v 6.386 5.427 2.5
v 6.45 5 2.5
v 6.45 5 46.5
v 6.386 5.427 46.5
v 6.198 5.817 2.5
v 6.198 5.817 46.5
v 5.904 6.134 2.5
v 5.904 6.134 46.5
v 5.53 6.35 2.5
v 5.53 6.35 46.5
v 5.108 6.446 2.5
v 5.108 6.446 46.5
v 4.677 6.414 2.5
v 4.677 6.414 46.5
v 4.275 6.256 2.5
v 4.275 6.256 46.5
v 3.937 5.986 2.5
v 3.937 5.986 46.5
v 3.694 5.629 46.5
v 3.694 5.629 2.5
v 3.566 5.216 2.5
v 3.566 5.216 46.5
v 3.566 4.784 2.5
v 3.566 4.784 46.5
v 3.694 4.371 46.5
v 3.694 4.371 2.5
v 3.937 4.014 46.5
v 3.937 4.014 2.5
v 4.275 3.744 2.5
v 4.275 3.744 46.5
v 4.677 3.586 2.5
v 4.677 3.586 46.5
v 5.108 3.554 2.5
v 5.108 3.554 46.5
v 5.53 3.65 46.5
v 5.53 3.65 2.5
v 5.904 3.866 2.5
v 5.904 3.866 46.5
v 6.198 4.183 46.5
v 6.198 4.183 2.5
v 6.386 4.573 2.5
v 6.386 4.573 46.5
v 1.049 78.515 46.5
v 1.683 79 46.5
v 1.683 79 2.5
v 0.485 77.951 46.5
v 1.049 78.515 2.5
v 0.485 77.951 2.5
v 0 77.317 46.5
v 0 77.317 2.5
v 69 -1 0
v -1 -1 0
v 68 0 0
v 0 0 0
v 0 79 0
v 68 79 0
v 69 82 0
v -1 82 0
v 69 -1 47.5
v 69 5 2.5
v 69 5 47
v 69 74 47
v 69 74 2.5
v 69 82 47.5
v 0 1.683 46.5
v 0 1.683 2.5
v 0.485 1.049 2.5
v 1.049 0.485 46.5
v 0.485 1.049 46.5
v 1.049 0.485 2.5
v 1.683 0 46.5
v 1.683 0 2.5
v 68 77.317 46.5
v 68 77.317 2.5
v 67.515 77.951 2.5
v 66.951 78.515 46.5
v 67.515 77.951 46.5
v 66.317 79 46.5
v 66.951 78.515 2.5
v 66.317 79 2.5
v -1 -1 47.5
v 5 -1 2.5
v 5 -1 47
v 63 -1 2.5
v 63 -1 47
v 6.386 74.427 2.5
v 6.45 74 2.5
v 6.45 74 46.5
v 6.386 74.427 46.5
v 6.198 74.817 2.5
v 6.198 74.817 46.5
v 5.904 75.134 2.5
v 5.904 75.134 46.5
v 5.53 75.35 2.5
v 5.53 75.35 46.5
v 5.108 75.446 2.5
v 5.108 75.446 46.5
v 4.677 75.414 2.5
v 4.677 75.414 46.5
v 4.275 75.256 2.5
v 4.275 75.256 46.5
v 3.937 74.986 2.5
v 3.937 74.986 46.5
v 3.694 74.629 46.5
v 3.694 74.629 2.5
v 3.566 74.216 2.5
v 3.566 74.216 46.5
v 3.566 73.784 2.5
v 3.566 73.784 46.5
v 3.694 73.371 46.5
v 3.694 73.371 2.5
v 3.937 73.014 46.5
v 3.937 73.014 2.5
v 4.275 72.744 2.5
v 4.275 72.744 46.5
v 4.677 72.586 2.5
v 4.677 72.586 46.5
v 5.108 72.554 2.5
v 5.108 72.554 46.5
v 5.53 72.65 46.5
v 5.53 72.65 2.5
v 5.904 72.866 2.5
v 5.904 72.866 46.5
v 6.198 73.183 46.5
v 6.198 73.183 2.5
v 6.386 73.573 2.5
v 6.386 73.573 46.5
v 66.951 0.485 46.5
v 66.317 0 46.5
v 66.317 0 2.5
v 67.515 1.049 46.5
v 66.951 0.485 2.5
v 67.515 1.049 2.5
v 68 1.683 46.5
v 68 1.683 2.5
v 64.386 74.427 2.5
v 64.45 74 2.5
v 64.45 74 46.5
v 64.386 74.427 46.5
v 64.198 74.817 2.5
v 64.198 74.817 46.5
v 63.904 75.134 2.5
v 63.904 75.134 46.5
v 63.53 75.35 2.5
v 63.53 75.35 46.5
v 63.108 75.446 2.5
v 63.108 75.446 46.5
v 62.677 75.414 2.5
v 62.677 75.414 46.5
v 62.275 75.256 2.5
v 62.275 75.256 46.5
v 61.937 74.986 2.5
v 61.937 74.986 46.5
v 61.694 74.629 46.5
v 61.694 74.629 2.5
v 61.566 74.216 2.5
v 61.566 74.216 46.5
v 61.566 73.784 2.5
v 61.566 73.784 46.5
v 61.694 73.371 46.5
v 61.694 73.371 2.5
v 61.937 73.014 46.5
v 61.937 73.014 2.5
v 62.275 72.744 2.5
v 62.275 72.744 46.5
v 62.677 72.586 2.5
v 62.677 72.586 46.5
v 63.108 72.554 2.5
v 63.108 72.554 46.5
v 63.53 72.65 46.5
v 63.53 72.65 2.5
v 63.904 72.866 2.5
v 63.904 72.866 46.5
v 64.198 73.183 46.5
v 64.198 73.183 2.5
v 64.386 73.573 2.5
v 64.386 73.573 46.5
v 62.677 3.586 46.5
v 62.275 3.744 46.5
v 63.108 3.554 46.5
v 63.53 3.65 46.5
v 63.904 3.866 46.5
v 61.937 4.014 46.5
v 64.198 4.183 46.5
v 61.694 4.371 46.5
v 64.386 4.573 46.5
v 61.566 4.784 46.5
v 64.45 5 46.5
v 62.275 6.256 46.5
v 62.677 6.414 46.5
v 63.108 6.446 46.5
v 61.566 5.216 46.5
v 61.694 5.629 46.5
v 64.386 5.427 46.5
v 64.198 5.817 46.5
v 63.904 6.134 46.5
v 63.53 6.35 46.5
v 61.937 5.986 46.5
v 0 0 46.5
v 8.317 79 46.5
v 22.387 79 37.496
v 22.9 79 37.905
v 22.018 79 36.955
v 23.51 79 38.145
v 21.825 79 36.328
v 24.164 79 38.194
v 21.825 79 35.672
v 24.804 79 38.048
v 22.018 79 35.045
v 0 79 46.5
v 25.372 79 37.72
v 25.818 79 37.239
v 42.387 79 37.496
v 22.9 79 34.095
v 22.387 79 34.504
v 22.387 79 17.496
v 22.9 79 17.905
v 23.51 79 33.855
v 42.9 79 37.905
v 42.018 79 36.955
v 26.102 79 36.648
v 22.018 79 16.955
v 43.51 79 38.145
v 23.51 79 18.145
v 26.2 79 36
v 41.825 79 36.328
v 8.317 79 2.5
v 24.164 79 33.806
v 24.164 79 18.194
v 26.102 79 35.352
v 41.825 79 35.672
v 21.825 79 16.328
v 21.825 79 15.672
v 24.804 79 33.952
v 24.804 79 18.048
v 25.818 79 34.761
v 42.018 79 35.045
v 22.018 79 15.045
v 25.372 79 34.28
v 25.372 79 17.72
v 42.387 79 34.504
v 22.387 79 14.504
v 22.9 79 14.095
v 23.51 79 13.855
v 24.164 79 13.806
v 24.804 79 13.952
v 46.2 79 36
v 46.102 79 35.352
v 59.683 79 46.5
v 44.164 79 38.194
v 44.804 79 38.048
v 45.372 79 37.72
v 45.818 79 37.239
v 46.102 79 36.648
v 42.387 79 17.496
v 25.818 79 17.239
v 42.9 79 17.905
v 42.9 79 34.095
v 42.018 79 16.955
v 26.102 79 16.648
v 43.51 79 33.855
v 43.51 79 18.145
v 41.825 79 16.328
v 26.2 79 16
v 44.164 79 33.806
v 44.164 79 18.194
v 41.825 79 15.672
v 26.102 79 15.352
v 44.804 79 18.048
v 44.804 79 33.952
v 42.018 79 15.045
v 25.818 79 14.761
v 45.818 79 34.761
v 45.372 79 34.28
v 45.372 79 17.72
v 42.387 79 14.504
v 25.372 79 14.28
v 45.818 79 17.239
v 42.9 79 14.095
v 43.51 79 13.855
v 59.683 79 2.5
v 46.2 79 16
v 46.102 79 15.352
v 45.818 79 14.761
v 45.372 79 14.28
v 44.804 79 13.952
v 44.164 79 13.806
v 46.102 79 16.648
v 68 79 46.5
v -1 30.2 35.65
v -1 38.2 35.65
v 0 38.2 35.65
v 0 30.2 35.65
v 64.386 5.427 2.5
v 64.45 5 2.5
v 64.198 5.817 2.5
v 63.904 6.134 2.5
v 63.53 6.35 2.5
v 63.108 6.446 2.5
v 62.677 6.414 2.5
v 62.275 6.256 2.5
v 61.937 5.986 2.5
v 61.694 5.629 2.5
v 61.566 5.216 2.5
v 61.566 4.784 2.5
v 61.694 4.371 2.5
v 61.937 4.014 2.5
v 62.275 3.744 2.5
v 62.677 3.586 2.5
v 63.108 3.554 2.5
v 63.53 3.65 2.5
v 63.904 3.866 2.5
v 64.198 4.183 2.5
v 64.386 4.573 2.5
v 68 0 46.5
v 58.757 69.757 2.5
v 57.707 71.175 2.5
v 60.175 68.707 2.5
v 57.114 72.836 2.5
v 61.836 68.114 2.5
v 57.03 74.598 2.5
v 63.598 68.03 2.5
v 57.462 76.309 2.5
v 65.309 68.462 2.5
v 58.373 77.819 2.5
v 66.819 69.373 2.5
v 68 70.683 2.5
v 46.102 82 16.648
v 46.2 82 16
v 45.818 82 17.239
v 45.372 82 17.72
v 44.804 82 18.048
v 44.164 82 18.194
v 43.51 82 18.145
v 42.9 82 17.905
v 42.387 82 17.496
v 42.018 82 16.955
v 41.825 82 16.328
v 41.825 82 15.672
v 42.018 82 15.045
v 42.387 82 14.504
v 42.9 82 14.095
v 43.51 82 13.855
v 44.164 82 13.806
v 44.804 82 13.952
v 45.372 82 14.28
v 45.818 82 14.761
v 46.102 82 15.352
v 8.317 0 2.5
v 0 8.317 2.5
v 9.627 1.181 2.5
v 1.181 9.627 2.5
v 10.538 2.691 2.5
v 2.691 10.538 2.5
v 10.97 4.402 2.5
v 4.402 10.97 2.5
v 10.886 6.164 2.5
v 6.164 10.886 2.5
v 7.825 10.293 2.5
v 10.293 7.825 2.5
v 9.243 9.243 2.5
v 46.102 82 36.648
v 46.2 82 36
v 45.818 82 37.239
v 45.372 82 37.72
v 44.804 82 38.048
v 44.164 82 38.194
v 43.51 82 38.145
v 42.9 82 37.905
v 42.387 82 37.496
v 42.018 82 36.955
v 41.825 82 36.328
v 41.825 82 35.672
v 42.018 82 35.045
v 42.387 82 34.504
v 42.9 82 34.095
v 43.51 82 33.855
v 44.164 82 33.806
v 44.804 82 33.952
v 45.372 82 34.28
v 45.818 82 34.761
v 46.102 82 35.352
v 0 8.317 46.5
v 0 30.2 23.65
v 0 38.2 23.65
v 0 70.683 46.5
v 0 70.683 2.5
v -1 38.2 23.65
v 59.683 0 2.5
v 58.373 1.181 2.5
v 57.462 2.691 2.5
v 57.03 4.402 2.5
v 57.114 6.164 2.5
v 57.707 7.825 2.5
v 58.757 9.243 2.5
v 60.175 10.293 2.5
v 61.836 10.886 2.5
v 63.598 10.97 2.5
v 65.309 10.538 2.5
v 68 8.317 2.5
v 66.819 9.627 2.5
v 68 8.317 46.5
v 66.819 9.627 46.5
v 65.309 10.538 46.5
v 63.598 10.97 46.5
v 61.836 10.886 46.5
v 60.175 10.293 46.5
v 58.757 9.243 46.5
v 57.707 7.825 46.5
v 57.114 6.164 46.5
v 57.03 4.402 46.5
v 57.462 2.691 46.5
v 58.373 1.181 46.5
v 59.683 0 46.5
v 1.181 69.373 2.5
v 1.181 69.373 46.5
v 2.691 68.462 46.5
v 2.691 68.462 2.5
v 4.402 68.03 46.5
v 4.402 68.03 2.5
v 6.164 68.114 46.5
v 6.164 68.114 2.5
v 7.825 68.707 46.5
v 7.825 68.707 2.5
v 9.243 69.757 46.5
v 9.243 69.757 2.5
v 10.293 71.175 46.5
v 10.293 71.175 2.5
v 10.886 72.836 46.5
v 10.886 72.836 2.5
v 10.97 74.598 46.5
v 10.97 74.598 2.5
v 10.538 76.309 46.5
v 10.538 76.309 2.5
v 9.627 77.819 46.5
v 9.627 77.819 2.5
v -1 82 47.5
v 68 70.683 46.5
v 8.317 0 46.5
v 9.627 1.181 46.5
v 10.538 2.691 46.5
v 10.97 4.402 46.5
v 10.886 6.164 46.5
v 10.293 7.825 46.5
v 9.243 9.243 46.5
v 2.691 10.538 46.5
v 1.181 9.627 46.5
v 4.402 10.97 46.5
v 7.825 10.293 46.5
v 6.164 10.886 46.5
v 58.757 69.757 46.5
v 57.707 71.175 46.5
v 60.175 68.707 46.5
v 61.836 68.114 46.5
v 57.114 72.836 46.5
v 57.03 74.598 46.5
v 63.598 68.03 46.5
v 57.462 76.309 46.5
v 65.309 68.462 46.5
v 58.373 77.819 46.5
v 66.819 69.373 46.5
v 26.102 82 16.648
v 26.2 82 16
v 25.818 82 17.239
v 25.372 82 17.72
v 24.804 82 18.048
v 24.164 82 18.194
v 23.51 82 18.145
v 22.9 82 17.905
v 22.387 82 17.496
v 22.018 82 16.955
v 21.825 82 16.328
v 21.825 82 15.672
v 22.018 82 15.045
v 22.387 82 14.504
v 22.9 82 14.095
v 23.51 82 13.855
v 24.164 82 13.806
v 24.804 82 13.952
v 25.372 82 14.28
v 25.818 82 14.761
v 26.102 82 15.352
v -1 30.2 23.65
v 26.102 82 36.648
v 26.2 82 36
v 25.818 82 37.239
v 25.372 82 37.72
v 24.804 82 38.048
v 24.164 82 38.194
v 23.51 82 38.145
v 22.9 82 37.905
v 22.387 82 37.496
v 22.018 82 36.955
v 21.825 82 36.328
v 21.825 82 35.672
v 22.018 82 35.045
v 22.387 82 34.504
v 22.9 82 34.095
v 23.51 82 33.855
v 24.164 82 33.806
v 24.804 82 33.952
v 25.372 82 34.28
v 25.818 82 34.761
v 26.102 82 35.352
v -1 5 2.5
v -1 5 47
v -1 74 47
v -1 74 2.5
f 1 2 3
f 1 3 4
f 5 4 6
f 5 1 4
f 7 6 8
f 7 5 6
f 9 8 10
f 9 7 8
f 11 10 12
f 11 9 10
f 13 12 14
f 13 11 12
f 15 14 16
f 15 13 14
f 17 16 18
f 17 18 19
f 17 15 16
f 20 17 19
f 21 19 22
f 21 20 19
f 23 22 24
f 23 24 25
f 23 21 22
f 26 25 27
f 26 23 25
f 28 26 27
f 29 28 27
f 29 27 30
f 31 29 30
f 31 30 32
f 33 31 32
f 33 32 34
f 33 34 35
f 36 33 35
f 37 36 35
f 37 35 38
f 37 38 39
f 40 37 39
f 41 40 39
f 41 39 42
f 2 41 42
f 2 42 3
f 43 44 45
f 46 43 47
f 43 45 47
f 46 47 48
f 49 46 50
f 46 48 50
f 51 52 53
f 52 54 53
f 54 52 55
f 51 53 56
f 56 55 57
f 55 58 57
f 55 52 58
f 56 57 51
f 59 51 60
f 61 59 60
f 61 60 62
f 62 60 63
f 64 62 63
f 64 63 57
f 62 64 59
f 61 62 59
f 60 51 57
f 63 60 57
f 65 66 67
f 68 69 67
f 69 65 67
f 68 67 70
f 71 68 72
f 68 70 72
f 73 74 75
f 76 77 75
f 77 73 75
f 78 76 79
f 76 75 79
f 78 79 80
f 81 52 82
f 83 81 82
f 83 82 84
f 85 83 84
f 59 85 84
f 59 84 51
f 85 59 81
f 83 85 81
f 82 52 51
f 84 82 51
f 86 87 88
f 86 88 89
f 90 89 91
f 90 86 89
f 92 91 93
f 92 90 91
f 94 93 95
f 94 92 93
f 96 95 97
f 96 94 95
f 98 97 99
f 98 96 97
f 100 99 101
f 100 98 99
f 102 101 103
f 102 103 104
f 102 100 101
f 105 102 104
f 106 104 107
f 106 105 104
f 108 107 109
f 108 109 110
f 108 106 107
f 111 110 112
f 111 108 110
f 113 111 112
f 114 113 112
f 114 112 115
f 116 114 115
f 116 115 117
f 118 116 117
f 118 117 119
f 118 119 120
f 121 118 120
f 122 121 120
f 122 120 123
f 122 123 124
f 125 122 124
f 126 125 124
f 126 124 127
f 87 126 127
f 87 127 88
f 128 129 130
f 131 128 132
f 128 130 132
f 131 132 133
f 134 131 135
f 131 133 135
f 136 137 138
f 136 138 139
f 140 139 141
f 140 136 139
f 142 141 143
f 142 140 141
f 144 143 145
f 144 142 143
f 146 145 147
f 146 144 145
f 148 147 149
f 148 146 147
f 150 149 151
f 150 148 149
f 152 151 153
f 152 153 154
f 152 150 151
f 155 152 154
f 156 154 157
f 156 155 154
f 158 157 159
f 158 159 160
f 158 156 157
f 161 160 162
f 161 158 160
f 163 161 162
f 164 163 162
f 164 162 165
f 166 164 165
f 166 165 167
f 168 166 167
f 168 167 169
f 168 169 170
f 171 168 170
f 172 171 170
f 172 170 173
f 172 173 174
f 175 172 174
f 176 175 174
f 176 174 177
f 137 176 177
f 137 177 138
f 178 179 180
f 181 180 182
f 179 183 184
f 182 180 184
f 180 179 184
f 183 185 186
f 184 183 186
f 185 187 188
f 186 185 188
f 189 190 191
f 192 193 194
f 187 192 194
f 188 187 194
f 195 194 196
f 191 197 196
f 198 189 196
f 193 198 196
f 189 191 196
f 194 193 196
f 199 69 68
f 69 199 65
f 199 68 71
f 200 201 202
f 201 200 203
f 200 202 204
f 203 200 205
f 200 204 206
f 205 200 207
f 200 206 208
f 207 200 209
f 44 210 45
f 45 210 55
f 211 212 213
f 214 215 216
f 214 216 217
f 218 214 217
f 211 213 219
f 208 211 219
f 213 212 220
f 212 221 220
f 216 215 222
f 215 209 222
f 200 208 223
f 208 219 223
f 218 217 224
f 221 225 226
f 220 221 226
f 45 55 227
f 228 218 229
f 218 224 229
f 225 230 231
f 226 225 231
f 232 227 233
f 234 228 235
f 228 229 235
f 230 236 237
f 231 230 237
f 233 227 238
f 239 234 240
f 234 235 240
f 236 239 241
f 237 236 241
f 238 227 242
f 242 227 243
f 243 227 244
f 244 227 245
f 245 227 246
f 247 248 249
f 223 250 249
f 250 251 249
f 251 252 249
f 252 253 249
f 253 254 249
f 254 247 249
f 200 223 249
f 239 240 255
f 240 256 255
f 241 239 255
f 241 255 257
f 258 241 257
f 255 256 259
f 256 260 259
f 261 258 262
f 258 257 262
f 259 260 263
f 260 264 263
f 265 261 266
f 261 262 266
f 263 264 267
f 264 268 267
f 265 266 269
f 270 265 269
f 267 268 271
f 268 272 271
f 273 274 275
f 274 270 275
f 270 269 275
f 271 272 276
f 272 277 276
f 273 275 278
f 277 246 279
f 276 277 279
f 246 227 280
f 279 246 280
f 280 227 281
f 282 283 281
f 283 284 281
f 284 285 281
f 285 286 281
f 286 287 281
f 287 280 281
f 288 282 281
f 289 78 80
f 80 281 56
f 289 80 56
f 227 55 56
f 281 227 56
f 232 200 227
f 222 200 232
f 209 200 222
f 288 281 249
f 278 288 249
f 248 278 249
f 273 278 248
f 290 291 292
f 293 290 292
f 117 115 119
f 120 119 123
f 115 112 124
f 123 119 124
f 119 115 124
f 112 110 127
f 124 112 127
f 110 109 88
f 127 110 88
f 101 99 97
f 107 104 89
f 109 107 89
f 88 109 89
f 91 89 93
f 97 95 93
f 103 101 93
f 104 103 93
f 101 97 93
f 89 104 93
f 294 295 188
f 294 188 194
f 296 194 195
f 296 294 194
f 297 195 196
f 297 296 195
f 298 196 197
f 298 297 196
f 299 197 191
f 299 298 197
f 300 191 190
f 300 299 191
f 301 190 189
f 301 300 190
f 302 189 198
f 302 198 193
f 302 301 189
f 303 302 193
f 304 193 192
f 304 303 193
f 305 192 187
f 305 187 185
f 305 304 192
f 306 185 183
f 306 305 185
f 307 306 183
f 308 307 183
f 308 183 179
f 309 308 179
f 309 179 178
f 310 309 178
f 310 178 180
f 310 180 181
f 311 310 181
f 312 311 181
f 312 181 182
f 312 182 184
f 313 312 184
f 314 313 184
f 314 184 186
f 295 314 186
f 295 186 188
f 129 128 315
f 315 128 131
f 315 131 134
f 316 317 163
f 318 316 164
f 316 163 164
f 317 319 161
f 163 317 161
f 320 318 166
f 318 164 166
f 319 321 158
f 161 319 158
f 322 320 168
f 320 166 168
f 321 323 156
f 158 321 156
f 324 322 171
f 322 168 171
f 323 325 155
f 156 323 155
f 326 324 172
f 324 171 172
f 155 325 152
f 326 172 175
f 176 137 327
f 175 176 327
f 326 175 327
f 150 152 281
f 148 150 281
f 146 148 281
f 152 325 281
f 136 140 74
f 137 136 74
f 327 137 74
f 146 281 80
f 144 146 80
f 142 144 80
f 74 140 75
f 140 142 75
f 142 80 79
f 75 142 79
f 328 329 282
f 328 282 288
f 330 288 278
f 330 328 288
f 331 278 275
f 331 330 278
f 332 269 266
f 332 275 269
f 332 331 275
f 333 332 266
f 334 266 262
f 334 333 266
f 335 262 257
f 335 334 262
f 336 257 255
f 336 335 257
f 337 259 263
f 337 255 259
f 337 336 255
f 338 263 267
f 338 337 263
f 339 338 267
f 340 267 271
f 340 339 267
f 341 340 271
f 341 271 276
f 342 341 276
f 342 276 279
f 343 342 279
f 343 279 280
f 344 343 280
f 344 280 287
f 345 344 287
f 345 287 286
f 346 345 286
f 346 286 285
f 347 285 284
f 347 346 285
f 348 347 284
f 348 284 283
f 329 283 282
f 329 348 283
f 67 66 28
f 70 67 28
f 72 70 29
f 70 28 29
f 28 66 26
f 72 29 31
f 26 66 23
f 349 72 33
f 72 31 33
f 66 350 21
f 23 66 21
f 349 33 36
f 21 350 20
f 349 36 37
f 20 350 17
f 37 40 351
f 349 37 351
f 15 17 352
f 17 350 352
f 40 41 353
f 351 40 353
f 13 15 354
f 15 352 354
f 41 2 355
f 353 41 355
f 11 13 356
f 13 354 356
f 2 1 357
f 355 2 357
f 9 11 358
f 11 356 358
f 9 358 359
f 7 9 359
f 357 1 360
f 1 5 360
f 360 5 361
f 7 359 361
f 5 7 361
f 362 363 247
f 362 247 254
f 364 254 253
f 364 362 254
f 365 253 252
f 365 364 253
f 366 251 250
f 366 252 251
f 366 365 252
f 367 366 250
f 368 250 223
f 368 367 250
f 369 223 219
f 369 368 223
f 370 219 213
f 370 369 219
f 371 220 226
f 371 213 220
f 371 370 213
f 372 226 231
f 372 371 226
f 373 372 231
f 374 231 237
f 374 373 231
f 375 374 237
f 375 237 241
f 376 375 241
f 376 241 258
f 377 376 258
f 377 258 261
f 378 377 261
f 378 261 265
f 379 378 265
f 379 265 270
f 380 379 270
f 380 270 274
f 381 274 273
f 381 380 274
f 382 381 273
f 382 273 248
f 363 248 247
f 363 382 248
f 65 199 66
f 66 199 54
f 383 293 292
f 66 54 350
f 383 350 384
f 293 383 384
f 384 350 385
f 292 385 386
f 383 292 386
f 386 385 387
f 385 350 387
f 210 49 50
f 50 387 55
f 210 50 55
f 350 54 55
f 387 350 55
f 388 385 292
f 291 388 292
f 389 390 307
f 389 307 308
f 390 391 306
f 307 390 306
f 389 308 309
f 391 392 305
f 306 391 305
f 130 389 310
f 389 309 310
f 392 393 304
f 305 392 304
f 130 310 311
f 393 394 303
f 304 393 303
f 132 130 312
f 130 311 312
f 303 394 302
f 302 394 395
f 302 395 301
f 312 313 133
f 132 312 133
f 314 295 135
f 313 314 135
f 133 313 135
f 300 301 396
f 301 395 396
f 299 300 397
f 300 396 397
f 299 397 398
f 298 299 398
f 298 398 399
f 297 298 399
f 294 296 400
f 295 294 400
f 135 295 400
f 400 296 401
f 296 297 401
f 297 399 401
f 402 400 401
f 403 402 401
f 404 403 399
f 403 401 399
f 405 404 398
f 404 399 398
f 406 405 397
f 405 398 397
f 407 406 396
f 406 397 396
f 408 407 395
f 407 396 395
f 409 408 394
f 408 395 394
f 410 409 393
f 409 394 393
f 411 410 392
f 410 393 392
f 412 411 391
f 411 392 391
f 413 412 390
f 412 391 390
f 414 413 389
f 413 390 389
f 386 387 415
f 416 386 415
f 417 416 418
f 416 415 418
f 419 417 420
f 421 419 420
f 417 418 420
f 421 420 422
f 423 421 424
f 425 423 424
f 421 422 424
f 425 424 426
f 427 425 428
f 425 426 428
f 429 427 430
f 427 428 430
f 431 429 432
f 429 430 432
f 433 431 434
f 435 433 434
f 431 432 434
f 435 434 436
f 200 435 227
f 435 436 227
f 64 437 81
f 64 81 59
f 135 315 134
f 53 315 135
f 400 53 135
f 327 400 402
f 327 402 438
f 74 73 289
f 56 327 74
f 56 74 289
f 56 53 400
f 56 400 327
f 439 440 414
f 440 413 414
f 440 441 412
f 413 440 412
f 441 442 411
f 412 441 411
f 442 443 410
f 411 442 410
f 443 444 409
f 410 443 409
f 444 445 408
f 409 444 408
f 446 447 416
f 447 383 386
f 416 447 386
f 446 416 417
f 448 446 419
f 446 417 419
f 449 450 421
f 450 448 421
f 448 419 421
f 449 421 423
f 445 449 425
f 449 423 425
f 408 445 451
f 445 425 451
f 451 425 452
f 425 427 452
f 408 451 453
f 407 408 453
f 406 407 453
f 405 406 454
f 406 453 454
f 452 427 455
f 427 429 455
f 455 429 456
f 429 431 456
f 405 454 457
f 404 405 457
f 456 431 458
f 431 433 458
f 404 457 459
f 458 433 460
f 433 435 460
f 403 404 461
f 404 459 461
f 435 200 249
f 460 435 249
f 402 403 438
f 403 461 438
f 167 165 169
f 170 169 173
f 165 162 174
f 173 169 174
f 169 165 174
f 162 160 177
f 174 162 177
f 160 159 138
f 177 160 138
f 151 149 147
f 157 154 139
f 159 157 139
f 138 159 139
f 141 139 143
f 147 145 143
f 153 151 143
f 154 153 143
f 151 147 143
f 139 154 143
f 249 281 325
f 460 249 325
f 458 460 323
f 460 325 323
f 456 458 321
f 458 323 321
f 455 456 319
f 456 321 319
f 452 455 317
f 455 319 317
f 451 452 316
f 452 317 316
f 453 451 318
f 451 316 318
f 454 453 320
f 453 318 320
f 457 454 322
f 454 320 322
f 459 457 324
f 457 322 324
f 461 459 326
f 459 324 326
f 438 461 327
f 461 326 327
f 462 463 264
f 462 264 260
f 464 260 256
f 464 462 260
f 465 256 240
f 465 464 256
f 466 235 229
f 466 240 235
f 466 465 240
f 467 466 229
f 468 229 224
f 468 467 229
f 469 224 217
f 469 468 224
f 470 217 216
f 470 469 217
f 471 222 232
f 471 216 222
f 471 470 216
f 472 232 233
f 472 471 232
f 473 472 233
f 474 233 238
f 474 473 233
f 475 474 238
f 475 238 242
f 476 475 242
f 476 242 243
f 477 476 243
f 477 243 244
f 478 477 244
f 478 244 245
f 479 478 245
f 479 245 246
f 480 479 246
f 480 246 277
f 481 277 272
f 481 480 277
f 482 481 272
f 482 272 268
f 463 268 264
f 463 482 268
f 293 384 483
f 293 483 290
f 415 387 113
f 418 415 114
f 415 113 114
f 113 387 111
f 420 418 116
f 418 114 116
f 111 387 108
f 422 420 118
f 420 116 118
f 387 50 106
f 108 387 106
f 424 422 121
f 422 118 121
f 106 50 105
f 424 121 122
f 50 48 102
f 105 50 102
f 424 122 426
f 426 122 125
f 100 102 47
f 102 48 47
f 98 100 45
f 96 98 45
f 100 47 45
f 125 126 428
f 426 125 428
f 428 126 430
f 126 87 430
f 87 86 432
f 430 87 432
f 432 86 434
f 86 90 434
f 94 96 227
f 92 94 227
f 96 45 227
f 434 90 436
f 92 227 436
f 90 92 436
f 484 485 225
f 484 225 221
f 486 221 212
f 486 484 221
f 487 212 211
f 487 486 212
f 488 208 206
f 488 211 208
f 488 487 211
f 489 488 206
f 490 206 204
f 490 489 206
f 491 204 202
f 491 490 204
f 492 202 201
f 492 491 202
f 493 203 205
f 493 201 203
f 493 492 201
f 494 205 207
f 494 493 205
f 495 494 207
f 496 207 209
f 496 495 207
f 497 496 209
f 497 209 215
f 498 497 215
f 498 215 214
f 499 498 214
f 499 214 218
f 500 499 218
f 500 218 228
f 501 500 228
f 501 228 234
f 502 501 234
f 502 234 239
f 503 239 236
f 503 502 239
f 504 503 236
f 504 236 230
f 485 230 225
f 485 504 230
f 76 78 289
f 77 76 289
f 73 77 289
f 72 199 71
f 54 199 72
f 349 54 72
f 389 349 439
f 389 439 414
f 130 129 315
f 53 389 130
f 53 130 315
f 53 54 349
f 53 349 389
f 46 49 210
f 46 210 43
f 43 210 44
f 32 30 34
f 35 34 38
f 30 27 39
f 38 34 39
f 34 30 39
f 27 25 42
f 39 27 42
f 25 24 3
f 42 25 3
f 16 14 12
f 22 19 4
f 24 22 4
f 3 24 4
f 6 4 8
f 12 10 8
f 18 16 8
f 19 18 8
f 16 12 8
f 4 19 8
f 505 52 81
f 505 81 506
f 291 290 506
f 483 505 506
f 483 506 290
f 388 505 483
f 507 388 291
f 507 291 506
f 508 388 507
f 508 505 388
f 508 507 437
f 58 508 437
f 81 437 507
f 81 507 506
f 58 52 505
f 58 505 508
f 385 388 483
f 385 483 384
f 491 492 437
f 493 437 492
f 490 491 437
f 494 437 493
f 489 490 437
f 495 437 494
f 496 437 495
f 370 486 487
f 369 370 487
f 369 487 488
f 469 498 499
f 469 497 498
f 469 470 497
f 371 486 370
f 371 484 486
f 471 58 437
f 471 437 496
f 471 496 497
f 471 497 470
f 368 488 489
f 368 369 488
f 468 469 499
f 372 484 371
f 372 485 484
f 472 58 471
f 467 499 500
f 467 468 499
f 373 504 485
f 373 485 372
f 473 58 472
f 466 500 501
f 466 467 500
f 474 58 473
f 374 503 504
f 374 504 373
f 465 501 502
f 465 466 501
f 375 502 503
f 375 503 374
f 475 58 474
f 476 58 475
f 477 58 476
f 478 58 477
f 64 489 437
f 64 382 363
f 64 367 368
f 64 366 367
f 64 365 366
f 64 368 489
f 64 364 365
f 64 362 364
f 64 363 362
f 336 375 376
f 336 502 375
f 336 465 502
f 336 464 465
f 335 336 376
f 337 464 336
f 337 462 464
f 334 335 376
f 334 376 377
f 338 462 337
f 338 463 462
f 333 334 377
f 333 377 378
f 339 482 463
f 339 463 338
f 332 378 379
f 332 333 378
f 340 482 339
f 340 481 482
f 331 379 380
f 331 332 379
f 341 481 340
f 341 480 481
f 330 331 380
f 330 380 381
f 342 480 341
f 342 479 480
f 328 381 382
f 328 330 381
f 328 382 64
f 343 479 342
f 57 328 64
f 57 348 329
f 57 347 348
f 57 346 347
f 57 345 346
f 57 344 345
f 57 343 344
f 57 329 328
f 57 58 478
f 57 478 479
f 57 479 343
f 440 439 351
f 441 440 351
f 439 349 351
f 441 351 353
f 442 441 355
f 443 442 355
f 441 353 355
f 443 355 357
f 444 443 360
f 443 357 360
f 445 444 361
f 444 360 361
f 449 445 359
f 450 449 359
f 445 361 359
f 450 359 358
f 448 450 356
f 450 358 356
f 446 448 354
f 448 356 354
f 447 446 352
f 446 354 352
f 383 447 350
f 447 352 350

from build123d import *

# Parameters (mm, degrees)
CYLINDER006_R            = 1.45
CYLINDER006_DEPTH        = 46.5
ARRAY003_X_COUNT         = 2
ARRAY003_X_PITCH         = 58
ARRAY003_Y_COUNT         = 2
ARRAY003_Y_PITCH         = 69
CYLINDER005_R            = 6
CYLINDER005_DEPTH        = 44.5
ARRAY002_X_COUNT         = 2
ARRAY002_X_PITCH         = 58
ARRAY002_Y_COUNT         = 2
ARRAY002_Y_PITCH         = 69
CYLINDER004_R            = 2.2
CYLINDER004_DEPTH        = 10
ARRAY001_X_COUNT         = 2
ARRAY001_X_PITCH         = 20
ARRAY001_Y_COUNT         = 2
ARRAY001_Y_PITCH         = 20
ARRAY001_PLACEMENT_ANGLE = 90
BOX020_W                 = 12
BOX020_H                 = 30
BOX020_DEPTH             = 8
BOX006_W                 = 68
BOX006_H                 = 79
BOX006_DEPTH             = 46.5
BOX005_W                 = 70
BOX005_H                 = 83
BOX005_DEPTH             = 47.5


with BuildPart() as screw_hole_array:
    # Cylinder006 → Cylinder006 (new body)
    with BuildSketch(Plane(origin=(5, 5, 0), x_dir=(1, 0, 0), z_dir=(0, 0, 1))):
        Circle(CYLINDER006_R)
    extrude(amount=CYLINDER006_DEPTH)

    # Array003 X: screw hole array ×2


with BuildPart() as screw_hole_array_1:
    add(screw_hole_array.part)
    with Locations(*[(i * ARRAY003_X_PITCH, 0, 0) for i in range(1, ARRAY003_X_COUNT)]):
        add(screw_hole_array.part)

    # Array003 Y: screw hole array ×2


with BuildPart() as screw_hole_array_2:
    add(screw_hole_array_1.part)
    with Locations(*[(0, i * ARRAY003_Y_PITCH, 0) for i in range(1, ARRAY003_Y_COUNT)]):
        add(screw_hole_array_1.part)


with BuildPart() as bolt_stand_fusion:
    # Cylinder005 → Cylinder005 (new body)
    with BuildSketch(Plane(origin=(5, 5, 2.5), x_dir=(1, 0, 0), z_dir=(0, 0, 1))):
        Circle(CYLINDER005_R)
    extrude(amount=CYLINDER005_DEPTH)

    # Array002 X: bolt stand fusion ×2


with BuildPart() as bolt_stand_fusion_1:
    add(bolt_stand_fusion.part)
    with Locations(*[(i * ARRAY002_X_PITCH, 0, 0) for i in range(1, ARRAY002_X_COUNT)]):
        add(bolt_stand_fusion.part)

    # Array002 Y: bolt stand fusion ×2


with BuildPart() as bolt_stand_fusion_2:
    add(bolt_stand_fusion_1.part)
    with Locations(*[(0, i * ARRAY002_Y_PITCH, 0) for i in range(1, ARRAY002_Y_COUNT)]):
        add(bolt_stand_fusion_1.part)

    # Cut001004: cut screw hole array
    add(screw_hole_array_2.part, mode=Mode.SUBTRACT)


with BuildPart() as top_insert_hole_array:
    # Cylinder004 → Cylinder004 (new body)
    with BuildSketch(Plane.XY):
        Circle(CYLINDER004_R)
    extrude(amount=CYLINDER004_DEPTH)

    # Array001 X: top insert hole array ×2


with BuildPart() as top_insert_hole_array_1:
    add(top_insert_hole_array.part)
    with Locations(*[(i * ARRAY001_X_PITCH, 0, 0) for i in range(1, ARRAY001_X_COUNT)]):
        add(top_insert_hole_array.part)

    # Array001 Y: top insert hole array ×2


with BuildPart() as top_insert_hole_array_2:
    add(top_insert_hole_array_1.part)
    with Locations(*[(0, i * ARRAY001_Y_PITCH, 0) for i in range(1, ARRAY001_Y_COUNT)]):
        add(top_insert_hole_array_1.part)


with BuildPart() as top_insert_hole_array_3:
    # Array001 placement: moved
    add(top_insert_hole_array_2.part.moved(Location((24, 88, 16))).rotate(Axis((24, 88, 16), (1, 0, 0)), ARRAY001_PLACEMENT_ANGLE))


with BuildPart() as micro_usb_hole:
    # Box020 → Box020 (new body)
    with BuildSketch(Plane(origin=(-15, 30.2, 23.65), x_dir=(0, 0, 1), z_dir=(0, 1, 0))):
        with Locations((6, 15)):
            Rectangle(BOX020_W, BOX020_H)
    extrude(amount=BOX020_DEPTH)


with BuildPart() as back_box_extract_fusion:
    # Box006 → Box006 (new body)
    with BuildSketch(Plane.XY):
        with Locations((34, 39.5)):
            Rectangle(BOX006_W, BOX006_H)
    extrude(amount=BOX006_DEPTH)

    # Fusion006: union top insert hole array, micro usb hole
    add(top_insert_hole_array_3.part)
    add(micro_usb_hole.part)


with BuildPart() as back_box_fusion:
    # Box005 → Box005 (new body)
    with BuildSketch(Plane(origin=(-1, -1, 0), x_dir=(1, 0, 0), z_dir=(0, 0, 1))):
        with Locations((35, 41.5)):
            Rectangle(BOX005_W, BOX005_H)
    extrude(amount=BOX005_DEPTH)

    # Cut001003: cut back box extract fusion
    add(back_box_extract_fusion.part, mode=Mode.SUBTRACT)

    # Fusion007: union bolt stand fusion
    add(bolt_stand_fusion_2.part)


solid = back_box_fusion.part
